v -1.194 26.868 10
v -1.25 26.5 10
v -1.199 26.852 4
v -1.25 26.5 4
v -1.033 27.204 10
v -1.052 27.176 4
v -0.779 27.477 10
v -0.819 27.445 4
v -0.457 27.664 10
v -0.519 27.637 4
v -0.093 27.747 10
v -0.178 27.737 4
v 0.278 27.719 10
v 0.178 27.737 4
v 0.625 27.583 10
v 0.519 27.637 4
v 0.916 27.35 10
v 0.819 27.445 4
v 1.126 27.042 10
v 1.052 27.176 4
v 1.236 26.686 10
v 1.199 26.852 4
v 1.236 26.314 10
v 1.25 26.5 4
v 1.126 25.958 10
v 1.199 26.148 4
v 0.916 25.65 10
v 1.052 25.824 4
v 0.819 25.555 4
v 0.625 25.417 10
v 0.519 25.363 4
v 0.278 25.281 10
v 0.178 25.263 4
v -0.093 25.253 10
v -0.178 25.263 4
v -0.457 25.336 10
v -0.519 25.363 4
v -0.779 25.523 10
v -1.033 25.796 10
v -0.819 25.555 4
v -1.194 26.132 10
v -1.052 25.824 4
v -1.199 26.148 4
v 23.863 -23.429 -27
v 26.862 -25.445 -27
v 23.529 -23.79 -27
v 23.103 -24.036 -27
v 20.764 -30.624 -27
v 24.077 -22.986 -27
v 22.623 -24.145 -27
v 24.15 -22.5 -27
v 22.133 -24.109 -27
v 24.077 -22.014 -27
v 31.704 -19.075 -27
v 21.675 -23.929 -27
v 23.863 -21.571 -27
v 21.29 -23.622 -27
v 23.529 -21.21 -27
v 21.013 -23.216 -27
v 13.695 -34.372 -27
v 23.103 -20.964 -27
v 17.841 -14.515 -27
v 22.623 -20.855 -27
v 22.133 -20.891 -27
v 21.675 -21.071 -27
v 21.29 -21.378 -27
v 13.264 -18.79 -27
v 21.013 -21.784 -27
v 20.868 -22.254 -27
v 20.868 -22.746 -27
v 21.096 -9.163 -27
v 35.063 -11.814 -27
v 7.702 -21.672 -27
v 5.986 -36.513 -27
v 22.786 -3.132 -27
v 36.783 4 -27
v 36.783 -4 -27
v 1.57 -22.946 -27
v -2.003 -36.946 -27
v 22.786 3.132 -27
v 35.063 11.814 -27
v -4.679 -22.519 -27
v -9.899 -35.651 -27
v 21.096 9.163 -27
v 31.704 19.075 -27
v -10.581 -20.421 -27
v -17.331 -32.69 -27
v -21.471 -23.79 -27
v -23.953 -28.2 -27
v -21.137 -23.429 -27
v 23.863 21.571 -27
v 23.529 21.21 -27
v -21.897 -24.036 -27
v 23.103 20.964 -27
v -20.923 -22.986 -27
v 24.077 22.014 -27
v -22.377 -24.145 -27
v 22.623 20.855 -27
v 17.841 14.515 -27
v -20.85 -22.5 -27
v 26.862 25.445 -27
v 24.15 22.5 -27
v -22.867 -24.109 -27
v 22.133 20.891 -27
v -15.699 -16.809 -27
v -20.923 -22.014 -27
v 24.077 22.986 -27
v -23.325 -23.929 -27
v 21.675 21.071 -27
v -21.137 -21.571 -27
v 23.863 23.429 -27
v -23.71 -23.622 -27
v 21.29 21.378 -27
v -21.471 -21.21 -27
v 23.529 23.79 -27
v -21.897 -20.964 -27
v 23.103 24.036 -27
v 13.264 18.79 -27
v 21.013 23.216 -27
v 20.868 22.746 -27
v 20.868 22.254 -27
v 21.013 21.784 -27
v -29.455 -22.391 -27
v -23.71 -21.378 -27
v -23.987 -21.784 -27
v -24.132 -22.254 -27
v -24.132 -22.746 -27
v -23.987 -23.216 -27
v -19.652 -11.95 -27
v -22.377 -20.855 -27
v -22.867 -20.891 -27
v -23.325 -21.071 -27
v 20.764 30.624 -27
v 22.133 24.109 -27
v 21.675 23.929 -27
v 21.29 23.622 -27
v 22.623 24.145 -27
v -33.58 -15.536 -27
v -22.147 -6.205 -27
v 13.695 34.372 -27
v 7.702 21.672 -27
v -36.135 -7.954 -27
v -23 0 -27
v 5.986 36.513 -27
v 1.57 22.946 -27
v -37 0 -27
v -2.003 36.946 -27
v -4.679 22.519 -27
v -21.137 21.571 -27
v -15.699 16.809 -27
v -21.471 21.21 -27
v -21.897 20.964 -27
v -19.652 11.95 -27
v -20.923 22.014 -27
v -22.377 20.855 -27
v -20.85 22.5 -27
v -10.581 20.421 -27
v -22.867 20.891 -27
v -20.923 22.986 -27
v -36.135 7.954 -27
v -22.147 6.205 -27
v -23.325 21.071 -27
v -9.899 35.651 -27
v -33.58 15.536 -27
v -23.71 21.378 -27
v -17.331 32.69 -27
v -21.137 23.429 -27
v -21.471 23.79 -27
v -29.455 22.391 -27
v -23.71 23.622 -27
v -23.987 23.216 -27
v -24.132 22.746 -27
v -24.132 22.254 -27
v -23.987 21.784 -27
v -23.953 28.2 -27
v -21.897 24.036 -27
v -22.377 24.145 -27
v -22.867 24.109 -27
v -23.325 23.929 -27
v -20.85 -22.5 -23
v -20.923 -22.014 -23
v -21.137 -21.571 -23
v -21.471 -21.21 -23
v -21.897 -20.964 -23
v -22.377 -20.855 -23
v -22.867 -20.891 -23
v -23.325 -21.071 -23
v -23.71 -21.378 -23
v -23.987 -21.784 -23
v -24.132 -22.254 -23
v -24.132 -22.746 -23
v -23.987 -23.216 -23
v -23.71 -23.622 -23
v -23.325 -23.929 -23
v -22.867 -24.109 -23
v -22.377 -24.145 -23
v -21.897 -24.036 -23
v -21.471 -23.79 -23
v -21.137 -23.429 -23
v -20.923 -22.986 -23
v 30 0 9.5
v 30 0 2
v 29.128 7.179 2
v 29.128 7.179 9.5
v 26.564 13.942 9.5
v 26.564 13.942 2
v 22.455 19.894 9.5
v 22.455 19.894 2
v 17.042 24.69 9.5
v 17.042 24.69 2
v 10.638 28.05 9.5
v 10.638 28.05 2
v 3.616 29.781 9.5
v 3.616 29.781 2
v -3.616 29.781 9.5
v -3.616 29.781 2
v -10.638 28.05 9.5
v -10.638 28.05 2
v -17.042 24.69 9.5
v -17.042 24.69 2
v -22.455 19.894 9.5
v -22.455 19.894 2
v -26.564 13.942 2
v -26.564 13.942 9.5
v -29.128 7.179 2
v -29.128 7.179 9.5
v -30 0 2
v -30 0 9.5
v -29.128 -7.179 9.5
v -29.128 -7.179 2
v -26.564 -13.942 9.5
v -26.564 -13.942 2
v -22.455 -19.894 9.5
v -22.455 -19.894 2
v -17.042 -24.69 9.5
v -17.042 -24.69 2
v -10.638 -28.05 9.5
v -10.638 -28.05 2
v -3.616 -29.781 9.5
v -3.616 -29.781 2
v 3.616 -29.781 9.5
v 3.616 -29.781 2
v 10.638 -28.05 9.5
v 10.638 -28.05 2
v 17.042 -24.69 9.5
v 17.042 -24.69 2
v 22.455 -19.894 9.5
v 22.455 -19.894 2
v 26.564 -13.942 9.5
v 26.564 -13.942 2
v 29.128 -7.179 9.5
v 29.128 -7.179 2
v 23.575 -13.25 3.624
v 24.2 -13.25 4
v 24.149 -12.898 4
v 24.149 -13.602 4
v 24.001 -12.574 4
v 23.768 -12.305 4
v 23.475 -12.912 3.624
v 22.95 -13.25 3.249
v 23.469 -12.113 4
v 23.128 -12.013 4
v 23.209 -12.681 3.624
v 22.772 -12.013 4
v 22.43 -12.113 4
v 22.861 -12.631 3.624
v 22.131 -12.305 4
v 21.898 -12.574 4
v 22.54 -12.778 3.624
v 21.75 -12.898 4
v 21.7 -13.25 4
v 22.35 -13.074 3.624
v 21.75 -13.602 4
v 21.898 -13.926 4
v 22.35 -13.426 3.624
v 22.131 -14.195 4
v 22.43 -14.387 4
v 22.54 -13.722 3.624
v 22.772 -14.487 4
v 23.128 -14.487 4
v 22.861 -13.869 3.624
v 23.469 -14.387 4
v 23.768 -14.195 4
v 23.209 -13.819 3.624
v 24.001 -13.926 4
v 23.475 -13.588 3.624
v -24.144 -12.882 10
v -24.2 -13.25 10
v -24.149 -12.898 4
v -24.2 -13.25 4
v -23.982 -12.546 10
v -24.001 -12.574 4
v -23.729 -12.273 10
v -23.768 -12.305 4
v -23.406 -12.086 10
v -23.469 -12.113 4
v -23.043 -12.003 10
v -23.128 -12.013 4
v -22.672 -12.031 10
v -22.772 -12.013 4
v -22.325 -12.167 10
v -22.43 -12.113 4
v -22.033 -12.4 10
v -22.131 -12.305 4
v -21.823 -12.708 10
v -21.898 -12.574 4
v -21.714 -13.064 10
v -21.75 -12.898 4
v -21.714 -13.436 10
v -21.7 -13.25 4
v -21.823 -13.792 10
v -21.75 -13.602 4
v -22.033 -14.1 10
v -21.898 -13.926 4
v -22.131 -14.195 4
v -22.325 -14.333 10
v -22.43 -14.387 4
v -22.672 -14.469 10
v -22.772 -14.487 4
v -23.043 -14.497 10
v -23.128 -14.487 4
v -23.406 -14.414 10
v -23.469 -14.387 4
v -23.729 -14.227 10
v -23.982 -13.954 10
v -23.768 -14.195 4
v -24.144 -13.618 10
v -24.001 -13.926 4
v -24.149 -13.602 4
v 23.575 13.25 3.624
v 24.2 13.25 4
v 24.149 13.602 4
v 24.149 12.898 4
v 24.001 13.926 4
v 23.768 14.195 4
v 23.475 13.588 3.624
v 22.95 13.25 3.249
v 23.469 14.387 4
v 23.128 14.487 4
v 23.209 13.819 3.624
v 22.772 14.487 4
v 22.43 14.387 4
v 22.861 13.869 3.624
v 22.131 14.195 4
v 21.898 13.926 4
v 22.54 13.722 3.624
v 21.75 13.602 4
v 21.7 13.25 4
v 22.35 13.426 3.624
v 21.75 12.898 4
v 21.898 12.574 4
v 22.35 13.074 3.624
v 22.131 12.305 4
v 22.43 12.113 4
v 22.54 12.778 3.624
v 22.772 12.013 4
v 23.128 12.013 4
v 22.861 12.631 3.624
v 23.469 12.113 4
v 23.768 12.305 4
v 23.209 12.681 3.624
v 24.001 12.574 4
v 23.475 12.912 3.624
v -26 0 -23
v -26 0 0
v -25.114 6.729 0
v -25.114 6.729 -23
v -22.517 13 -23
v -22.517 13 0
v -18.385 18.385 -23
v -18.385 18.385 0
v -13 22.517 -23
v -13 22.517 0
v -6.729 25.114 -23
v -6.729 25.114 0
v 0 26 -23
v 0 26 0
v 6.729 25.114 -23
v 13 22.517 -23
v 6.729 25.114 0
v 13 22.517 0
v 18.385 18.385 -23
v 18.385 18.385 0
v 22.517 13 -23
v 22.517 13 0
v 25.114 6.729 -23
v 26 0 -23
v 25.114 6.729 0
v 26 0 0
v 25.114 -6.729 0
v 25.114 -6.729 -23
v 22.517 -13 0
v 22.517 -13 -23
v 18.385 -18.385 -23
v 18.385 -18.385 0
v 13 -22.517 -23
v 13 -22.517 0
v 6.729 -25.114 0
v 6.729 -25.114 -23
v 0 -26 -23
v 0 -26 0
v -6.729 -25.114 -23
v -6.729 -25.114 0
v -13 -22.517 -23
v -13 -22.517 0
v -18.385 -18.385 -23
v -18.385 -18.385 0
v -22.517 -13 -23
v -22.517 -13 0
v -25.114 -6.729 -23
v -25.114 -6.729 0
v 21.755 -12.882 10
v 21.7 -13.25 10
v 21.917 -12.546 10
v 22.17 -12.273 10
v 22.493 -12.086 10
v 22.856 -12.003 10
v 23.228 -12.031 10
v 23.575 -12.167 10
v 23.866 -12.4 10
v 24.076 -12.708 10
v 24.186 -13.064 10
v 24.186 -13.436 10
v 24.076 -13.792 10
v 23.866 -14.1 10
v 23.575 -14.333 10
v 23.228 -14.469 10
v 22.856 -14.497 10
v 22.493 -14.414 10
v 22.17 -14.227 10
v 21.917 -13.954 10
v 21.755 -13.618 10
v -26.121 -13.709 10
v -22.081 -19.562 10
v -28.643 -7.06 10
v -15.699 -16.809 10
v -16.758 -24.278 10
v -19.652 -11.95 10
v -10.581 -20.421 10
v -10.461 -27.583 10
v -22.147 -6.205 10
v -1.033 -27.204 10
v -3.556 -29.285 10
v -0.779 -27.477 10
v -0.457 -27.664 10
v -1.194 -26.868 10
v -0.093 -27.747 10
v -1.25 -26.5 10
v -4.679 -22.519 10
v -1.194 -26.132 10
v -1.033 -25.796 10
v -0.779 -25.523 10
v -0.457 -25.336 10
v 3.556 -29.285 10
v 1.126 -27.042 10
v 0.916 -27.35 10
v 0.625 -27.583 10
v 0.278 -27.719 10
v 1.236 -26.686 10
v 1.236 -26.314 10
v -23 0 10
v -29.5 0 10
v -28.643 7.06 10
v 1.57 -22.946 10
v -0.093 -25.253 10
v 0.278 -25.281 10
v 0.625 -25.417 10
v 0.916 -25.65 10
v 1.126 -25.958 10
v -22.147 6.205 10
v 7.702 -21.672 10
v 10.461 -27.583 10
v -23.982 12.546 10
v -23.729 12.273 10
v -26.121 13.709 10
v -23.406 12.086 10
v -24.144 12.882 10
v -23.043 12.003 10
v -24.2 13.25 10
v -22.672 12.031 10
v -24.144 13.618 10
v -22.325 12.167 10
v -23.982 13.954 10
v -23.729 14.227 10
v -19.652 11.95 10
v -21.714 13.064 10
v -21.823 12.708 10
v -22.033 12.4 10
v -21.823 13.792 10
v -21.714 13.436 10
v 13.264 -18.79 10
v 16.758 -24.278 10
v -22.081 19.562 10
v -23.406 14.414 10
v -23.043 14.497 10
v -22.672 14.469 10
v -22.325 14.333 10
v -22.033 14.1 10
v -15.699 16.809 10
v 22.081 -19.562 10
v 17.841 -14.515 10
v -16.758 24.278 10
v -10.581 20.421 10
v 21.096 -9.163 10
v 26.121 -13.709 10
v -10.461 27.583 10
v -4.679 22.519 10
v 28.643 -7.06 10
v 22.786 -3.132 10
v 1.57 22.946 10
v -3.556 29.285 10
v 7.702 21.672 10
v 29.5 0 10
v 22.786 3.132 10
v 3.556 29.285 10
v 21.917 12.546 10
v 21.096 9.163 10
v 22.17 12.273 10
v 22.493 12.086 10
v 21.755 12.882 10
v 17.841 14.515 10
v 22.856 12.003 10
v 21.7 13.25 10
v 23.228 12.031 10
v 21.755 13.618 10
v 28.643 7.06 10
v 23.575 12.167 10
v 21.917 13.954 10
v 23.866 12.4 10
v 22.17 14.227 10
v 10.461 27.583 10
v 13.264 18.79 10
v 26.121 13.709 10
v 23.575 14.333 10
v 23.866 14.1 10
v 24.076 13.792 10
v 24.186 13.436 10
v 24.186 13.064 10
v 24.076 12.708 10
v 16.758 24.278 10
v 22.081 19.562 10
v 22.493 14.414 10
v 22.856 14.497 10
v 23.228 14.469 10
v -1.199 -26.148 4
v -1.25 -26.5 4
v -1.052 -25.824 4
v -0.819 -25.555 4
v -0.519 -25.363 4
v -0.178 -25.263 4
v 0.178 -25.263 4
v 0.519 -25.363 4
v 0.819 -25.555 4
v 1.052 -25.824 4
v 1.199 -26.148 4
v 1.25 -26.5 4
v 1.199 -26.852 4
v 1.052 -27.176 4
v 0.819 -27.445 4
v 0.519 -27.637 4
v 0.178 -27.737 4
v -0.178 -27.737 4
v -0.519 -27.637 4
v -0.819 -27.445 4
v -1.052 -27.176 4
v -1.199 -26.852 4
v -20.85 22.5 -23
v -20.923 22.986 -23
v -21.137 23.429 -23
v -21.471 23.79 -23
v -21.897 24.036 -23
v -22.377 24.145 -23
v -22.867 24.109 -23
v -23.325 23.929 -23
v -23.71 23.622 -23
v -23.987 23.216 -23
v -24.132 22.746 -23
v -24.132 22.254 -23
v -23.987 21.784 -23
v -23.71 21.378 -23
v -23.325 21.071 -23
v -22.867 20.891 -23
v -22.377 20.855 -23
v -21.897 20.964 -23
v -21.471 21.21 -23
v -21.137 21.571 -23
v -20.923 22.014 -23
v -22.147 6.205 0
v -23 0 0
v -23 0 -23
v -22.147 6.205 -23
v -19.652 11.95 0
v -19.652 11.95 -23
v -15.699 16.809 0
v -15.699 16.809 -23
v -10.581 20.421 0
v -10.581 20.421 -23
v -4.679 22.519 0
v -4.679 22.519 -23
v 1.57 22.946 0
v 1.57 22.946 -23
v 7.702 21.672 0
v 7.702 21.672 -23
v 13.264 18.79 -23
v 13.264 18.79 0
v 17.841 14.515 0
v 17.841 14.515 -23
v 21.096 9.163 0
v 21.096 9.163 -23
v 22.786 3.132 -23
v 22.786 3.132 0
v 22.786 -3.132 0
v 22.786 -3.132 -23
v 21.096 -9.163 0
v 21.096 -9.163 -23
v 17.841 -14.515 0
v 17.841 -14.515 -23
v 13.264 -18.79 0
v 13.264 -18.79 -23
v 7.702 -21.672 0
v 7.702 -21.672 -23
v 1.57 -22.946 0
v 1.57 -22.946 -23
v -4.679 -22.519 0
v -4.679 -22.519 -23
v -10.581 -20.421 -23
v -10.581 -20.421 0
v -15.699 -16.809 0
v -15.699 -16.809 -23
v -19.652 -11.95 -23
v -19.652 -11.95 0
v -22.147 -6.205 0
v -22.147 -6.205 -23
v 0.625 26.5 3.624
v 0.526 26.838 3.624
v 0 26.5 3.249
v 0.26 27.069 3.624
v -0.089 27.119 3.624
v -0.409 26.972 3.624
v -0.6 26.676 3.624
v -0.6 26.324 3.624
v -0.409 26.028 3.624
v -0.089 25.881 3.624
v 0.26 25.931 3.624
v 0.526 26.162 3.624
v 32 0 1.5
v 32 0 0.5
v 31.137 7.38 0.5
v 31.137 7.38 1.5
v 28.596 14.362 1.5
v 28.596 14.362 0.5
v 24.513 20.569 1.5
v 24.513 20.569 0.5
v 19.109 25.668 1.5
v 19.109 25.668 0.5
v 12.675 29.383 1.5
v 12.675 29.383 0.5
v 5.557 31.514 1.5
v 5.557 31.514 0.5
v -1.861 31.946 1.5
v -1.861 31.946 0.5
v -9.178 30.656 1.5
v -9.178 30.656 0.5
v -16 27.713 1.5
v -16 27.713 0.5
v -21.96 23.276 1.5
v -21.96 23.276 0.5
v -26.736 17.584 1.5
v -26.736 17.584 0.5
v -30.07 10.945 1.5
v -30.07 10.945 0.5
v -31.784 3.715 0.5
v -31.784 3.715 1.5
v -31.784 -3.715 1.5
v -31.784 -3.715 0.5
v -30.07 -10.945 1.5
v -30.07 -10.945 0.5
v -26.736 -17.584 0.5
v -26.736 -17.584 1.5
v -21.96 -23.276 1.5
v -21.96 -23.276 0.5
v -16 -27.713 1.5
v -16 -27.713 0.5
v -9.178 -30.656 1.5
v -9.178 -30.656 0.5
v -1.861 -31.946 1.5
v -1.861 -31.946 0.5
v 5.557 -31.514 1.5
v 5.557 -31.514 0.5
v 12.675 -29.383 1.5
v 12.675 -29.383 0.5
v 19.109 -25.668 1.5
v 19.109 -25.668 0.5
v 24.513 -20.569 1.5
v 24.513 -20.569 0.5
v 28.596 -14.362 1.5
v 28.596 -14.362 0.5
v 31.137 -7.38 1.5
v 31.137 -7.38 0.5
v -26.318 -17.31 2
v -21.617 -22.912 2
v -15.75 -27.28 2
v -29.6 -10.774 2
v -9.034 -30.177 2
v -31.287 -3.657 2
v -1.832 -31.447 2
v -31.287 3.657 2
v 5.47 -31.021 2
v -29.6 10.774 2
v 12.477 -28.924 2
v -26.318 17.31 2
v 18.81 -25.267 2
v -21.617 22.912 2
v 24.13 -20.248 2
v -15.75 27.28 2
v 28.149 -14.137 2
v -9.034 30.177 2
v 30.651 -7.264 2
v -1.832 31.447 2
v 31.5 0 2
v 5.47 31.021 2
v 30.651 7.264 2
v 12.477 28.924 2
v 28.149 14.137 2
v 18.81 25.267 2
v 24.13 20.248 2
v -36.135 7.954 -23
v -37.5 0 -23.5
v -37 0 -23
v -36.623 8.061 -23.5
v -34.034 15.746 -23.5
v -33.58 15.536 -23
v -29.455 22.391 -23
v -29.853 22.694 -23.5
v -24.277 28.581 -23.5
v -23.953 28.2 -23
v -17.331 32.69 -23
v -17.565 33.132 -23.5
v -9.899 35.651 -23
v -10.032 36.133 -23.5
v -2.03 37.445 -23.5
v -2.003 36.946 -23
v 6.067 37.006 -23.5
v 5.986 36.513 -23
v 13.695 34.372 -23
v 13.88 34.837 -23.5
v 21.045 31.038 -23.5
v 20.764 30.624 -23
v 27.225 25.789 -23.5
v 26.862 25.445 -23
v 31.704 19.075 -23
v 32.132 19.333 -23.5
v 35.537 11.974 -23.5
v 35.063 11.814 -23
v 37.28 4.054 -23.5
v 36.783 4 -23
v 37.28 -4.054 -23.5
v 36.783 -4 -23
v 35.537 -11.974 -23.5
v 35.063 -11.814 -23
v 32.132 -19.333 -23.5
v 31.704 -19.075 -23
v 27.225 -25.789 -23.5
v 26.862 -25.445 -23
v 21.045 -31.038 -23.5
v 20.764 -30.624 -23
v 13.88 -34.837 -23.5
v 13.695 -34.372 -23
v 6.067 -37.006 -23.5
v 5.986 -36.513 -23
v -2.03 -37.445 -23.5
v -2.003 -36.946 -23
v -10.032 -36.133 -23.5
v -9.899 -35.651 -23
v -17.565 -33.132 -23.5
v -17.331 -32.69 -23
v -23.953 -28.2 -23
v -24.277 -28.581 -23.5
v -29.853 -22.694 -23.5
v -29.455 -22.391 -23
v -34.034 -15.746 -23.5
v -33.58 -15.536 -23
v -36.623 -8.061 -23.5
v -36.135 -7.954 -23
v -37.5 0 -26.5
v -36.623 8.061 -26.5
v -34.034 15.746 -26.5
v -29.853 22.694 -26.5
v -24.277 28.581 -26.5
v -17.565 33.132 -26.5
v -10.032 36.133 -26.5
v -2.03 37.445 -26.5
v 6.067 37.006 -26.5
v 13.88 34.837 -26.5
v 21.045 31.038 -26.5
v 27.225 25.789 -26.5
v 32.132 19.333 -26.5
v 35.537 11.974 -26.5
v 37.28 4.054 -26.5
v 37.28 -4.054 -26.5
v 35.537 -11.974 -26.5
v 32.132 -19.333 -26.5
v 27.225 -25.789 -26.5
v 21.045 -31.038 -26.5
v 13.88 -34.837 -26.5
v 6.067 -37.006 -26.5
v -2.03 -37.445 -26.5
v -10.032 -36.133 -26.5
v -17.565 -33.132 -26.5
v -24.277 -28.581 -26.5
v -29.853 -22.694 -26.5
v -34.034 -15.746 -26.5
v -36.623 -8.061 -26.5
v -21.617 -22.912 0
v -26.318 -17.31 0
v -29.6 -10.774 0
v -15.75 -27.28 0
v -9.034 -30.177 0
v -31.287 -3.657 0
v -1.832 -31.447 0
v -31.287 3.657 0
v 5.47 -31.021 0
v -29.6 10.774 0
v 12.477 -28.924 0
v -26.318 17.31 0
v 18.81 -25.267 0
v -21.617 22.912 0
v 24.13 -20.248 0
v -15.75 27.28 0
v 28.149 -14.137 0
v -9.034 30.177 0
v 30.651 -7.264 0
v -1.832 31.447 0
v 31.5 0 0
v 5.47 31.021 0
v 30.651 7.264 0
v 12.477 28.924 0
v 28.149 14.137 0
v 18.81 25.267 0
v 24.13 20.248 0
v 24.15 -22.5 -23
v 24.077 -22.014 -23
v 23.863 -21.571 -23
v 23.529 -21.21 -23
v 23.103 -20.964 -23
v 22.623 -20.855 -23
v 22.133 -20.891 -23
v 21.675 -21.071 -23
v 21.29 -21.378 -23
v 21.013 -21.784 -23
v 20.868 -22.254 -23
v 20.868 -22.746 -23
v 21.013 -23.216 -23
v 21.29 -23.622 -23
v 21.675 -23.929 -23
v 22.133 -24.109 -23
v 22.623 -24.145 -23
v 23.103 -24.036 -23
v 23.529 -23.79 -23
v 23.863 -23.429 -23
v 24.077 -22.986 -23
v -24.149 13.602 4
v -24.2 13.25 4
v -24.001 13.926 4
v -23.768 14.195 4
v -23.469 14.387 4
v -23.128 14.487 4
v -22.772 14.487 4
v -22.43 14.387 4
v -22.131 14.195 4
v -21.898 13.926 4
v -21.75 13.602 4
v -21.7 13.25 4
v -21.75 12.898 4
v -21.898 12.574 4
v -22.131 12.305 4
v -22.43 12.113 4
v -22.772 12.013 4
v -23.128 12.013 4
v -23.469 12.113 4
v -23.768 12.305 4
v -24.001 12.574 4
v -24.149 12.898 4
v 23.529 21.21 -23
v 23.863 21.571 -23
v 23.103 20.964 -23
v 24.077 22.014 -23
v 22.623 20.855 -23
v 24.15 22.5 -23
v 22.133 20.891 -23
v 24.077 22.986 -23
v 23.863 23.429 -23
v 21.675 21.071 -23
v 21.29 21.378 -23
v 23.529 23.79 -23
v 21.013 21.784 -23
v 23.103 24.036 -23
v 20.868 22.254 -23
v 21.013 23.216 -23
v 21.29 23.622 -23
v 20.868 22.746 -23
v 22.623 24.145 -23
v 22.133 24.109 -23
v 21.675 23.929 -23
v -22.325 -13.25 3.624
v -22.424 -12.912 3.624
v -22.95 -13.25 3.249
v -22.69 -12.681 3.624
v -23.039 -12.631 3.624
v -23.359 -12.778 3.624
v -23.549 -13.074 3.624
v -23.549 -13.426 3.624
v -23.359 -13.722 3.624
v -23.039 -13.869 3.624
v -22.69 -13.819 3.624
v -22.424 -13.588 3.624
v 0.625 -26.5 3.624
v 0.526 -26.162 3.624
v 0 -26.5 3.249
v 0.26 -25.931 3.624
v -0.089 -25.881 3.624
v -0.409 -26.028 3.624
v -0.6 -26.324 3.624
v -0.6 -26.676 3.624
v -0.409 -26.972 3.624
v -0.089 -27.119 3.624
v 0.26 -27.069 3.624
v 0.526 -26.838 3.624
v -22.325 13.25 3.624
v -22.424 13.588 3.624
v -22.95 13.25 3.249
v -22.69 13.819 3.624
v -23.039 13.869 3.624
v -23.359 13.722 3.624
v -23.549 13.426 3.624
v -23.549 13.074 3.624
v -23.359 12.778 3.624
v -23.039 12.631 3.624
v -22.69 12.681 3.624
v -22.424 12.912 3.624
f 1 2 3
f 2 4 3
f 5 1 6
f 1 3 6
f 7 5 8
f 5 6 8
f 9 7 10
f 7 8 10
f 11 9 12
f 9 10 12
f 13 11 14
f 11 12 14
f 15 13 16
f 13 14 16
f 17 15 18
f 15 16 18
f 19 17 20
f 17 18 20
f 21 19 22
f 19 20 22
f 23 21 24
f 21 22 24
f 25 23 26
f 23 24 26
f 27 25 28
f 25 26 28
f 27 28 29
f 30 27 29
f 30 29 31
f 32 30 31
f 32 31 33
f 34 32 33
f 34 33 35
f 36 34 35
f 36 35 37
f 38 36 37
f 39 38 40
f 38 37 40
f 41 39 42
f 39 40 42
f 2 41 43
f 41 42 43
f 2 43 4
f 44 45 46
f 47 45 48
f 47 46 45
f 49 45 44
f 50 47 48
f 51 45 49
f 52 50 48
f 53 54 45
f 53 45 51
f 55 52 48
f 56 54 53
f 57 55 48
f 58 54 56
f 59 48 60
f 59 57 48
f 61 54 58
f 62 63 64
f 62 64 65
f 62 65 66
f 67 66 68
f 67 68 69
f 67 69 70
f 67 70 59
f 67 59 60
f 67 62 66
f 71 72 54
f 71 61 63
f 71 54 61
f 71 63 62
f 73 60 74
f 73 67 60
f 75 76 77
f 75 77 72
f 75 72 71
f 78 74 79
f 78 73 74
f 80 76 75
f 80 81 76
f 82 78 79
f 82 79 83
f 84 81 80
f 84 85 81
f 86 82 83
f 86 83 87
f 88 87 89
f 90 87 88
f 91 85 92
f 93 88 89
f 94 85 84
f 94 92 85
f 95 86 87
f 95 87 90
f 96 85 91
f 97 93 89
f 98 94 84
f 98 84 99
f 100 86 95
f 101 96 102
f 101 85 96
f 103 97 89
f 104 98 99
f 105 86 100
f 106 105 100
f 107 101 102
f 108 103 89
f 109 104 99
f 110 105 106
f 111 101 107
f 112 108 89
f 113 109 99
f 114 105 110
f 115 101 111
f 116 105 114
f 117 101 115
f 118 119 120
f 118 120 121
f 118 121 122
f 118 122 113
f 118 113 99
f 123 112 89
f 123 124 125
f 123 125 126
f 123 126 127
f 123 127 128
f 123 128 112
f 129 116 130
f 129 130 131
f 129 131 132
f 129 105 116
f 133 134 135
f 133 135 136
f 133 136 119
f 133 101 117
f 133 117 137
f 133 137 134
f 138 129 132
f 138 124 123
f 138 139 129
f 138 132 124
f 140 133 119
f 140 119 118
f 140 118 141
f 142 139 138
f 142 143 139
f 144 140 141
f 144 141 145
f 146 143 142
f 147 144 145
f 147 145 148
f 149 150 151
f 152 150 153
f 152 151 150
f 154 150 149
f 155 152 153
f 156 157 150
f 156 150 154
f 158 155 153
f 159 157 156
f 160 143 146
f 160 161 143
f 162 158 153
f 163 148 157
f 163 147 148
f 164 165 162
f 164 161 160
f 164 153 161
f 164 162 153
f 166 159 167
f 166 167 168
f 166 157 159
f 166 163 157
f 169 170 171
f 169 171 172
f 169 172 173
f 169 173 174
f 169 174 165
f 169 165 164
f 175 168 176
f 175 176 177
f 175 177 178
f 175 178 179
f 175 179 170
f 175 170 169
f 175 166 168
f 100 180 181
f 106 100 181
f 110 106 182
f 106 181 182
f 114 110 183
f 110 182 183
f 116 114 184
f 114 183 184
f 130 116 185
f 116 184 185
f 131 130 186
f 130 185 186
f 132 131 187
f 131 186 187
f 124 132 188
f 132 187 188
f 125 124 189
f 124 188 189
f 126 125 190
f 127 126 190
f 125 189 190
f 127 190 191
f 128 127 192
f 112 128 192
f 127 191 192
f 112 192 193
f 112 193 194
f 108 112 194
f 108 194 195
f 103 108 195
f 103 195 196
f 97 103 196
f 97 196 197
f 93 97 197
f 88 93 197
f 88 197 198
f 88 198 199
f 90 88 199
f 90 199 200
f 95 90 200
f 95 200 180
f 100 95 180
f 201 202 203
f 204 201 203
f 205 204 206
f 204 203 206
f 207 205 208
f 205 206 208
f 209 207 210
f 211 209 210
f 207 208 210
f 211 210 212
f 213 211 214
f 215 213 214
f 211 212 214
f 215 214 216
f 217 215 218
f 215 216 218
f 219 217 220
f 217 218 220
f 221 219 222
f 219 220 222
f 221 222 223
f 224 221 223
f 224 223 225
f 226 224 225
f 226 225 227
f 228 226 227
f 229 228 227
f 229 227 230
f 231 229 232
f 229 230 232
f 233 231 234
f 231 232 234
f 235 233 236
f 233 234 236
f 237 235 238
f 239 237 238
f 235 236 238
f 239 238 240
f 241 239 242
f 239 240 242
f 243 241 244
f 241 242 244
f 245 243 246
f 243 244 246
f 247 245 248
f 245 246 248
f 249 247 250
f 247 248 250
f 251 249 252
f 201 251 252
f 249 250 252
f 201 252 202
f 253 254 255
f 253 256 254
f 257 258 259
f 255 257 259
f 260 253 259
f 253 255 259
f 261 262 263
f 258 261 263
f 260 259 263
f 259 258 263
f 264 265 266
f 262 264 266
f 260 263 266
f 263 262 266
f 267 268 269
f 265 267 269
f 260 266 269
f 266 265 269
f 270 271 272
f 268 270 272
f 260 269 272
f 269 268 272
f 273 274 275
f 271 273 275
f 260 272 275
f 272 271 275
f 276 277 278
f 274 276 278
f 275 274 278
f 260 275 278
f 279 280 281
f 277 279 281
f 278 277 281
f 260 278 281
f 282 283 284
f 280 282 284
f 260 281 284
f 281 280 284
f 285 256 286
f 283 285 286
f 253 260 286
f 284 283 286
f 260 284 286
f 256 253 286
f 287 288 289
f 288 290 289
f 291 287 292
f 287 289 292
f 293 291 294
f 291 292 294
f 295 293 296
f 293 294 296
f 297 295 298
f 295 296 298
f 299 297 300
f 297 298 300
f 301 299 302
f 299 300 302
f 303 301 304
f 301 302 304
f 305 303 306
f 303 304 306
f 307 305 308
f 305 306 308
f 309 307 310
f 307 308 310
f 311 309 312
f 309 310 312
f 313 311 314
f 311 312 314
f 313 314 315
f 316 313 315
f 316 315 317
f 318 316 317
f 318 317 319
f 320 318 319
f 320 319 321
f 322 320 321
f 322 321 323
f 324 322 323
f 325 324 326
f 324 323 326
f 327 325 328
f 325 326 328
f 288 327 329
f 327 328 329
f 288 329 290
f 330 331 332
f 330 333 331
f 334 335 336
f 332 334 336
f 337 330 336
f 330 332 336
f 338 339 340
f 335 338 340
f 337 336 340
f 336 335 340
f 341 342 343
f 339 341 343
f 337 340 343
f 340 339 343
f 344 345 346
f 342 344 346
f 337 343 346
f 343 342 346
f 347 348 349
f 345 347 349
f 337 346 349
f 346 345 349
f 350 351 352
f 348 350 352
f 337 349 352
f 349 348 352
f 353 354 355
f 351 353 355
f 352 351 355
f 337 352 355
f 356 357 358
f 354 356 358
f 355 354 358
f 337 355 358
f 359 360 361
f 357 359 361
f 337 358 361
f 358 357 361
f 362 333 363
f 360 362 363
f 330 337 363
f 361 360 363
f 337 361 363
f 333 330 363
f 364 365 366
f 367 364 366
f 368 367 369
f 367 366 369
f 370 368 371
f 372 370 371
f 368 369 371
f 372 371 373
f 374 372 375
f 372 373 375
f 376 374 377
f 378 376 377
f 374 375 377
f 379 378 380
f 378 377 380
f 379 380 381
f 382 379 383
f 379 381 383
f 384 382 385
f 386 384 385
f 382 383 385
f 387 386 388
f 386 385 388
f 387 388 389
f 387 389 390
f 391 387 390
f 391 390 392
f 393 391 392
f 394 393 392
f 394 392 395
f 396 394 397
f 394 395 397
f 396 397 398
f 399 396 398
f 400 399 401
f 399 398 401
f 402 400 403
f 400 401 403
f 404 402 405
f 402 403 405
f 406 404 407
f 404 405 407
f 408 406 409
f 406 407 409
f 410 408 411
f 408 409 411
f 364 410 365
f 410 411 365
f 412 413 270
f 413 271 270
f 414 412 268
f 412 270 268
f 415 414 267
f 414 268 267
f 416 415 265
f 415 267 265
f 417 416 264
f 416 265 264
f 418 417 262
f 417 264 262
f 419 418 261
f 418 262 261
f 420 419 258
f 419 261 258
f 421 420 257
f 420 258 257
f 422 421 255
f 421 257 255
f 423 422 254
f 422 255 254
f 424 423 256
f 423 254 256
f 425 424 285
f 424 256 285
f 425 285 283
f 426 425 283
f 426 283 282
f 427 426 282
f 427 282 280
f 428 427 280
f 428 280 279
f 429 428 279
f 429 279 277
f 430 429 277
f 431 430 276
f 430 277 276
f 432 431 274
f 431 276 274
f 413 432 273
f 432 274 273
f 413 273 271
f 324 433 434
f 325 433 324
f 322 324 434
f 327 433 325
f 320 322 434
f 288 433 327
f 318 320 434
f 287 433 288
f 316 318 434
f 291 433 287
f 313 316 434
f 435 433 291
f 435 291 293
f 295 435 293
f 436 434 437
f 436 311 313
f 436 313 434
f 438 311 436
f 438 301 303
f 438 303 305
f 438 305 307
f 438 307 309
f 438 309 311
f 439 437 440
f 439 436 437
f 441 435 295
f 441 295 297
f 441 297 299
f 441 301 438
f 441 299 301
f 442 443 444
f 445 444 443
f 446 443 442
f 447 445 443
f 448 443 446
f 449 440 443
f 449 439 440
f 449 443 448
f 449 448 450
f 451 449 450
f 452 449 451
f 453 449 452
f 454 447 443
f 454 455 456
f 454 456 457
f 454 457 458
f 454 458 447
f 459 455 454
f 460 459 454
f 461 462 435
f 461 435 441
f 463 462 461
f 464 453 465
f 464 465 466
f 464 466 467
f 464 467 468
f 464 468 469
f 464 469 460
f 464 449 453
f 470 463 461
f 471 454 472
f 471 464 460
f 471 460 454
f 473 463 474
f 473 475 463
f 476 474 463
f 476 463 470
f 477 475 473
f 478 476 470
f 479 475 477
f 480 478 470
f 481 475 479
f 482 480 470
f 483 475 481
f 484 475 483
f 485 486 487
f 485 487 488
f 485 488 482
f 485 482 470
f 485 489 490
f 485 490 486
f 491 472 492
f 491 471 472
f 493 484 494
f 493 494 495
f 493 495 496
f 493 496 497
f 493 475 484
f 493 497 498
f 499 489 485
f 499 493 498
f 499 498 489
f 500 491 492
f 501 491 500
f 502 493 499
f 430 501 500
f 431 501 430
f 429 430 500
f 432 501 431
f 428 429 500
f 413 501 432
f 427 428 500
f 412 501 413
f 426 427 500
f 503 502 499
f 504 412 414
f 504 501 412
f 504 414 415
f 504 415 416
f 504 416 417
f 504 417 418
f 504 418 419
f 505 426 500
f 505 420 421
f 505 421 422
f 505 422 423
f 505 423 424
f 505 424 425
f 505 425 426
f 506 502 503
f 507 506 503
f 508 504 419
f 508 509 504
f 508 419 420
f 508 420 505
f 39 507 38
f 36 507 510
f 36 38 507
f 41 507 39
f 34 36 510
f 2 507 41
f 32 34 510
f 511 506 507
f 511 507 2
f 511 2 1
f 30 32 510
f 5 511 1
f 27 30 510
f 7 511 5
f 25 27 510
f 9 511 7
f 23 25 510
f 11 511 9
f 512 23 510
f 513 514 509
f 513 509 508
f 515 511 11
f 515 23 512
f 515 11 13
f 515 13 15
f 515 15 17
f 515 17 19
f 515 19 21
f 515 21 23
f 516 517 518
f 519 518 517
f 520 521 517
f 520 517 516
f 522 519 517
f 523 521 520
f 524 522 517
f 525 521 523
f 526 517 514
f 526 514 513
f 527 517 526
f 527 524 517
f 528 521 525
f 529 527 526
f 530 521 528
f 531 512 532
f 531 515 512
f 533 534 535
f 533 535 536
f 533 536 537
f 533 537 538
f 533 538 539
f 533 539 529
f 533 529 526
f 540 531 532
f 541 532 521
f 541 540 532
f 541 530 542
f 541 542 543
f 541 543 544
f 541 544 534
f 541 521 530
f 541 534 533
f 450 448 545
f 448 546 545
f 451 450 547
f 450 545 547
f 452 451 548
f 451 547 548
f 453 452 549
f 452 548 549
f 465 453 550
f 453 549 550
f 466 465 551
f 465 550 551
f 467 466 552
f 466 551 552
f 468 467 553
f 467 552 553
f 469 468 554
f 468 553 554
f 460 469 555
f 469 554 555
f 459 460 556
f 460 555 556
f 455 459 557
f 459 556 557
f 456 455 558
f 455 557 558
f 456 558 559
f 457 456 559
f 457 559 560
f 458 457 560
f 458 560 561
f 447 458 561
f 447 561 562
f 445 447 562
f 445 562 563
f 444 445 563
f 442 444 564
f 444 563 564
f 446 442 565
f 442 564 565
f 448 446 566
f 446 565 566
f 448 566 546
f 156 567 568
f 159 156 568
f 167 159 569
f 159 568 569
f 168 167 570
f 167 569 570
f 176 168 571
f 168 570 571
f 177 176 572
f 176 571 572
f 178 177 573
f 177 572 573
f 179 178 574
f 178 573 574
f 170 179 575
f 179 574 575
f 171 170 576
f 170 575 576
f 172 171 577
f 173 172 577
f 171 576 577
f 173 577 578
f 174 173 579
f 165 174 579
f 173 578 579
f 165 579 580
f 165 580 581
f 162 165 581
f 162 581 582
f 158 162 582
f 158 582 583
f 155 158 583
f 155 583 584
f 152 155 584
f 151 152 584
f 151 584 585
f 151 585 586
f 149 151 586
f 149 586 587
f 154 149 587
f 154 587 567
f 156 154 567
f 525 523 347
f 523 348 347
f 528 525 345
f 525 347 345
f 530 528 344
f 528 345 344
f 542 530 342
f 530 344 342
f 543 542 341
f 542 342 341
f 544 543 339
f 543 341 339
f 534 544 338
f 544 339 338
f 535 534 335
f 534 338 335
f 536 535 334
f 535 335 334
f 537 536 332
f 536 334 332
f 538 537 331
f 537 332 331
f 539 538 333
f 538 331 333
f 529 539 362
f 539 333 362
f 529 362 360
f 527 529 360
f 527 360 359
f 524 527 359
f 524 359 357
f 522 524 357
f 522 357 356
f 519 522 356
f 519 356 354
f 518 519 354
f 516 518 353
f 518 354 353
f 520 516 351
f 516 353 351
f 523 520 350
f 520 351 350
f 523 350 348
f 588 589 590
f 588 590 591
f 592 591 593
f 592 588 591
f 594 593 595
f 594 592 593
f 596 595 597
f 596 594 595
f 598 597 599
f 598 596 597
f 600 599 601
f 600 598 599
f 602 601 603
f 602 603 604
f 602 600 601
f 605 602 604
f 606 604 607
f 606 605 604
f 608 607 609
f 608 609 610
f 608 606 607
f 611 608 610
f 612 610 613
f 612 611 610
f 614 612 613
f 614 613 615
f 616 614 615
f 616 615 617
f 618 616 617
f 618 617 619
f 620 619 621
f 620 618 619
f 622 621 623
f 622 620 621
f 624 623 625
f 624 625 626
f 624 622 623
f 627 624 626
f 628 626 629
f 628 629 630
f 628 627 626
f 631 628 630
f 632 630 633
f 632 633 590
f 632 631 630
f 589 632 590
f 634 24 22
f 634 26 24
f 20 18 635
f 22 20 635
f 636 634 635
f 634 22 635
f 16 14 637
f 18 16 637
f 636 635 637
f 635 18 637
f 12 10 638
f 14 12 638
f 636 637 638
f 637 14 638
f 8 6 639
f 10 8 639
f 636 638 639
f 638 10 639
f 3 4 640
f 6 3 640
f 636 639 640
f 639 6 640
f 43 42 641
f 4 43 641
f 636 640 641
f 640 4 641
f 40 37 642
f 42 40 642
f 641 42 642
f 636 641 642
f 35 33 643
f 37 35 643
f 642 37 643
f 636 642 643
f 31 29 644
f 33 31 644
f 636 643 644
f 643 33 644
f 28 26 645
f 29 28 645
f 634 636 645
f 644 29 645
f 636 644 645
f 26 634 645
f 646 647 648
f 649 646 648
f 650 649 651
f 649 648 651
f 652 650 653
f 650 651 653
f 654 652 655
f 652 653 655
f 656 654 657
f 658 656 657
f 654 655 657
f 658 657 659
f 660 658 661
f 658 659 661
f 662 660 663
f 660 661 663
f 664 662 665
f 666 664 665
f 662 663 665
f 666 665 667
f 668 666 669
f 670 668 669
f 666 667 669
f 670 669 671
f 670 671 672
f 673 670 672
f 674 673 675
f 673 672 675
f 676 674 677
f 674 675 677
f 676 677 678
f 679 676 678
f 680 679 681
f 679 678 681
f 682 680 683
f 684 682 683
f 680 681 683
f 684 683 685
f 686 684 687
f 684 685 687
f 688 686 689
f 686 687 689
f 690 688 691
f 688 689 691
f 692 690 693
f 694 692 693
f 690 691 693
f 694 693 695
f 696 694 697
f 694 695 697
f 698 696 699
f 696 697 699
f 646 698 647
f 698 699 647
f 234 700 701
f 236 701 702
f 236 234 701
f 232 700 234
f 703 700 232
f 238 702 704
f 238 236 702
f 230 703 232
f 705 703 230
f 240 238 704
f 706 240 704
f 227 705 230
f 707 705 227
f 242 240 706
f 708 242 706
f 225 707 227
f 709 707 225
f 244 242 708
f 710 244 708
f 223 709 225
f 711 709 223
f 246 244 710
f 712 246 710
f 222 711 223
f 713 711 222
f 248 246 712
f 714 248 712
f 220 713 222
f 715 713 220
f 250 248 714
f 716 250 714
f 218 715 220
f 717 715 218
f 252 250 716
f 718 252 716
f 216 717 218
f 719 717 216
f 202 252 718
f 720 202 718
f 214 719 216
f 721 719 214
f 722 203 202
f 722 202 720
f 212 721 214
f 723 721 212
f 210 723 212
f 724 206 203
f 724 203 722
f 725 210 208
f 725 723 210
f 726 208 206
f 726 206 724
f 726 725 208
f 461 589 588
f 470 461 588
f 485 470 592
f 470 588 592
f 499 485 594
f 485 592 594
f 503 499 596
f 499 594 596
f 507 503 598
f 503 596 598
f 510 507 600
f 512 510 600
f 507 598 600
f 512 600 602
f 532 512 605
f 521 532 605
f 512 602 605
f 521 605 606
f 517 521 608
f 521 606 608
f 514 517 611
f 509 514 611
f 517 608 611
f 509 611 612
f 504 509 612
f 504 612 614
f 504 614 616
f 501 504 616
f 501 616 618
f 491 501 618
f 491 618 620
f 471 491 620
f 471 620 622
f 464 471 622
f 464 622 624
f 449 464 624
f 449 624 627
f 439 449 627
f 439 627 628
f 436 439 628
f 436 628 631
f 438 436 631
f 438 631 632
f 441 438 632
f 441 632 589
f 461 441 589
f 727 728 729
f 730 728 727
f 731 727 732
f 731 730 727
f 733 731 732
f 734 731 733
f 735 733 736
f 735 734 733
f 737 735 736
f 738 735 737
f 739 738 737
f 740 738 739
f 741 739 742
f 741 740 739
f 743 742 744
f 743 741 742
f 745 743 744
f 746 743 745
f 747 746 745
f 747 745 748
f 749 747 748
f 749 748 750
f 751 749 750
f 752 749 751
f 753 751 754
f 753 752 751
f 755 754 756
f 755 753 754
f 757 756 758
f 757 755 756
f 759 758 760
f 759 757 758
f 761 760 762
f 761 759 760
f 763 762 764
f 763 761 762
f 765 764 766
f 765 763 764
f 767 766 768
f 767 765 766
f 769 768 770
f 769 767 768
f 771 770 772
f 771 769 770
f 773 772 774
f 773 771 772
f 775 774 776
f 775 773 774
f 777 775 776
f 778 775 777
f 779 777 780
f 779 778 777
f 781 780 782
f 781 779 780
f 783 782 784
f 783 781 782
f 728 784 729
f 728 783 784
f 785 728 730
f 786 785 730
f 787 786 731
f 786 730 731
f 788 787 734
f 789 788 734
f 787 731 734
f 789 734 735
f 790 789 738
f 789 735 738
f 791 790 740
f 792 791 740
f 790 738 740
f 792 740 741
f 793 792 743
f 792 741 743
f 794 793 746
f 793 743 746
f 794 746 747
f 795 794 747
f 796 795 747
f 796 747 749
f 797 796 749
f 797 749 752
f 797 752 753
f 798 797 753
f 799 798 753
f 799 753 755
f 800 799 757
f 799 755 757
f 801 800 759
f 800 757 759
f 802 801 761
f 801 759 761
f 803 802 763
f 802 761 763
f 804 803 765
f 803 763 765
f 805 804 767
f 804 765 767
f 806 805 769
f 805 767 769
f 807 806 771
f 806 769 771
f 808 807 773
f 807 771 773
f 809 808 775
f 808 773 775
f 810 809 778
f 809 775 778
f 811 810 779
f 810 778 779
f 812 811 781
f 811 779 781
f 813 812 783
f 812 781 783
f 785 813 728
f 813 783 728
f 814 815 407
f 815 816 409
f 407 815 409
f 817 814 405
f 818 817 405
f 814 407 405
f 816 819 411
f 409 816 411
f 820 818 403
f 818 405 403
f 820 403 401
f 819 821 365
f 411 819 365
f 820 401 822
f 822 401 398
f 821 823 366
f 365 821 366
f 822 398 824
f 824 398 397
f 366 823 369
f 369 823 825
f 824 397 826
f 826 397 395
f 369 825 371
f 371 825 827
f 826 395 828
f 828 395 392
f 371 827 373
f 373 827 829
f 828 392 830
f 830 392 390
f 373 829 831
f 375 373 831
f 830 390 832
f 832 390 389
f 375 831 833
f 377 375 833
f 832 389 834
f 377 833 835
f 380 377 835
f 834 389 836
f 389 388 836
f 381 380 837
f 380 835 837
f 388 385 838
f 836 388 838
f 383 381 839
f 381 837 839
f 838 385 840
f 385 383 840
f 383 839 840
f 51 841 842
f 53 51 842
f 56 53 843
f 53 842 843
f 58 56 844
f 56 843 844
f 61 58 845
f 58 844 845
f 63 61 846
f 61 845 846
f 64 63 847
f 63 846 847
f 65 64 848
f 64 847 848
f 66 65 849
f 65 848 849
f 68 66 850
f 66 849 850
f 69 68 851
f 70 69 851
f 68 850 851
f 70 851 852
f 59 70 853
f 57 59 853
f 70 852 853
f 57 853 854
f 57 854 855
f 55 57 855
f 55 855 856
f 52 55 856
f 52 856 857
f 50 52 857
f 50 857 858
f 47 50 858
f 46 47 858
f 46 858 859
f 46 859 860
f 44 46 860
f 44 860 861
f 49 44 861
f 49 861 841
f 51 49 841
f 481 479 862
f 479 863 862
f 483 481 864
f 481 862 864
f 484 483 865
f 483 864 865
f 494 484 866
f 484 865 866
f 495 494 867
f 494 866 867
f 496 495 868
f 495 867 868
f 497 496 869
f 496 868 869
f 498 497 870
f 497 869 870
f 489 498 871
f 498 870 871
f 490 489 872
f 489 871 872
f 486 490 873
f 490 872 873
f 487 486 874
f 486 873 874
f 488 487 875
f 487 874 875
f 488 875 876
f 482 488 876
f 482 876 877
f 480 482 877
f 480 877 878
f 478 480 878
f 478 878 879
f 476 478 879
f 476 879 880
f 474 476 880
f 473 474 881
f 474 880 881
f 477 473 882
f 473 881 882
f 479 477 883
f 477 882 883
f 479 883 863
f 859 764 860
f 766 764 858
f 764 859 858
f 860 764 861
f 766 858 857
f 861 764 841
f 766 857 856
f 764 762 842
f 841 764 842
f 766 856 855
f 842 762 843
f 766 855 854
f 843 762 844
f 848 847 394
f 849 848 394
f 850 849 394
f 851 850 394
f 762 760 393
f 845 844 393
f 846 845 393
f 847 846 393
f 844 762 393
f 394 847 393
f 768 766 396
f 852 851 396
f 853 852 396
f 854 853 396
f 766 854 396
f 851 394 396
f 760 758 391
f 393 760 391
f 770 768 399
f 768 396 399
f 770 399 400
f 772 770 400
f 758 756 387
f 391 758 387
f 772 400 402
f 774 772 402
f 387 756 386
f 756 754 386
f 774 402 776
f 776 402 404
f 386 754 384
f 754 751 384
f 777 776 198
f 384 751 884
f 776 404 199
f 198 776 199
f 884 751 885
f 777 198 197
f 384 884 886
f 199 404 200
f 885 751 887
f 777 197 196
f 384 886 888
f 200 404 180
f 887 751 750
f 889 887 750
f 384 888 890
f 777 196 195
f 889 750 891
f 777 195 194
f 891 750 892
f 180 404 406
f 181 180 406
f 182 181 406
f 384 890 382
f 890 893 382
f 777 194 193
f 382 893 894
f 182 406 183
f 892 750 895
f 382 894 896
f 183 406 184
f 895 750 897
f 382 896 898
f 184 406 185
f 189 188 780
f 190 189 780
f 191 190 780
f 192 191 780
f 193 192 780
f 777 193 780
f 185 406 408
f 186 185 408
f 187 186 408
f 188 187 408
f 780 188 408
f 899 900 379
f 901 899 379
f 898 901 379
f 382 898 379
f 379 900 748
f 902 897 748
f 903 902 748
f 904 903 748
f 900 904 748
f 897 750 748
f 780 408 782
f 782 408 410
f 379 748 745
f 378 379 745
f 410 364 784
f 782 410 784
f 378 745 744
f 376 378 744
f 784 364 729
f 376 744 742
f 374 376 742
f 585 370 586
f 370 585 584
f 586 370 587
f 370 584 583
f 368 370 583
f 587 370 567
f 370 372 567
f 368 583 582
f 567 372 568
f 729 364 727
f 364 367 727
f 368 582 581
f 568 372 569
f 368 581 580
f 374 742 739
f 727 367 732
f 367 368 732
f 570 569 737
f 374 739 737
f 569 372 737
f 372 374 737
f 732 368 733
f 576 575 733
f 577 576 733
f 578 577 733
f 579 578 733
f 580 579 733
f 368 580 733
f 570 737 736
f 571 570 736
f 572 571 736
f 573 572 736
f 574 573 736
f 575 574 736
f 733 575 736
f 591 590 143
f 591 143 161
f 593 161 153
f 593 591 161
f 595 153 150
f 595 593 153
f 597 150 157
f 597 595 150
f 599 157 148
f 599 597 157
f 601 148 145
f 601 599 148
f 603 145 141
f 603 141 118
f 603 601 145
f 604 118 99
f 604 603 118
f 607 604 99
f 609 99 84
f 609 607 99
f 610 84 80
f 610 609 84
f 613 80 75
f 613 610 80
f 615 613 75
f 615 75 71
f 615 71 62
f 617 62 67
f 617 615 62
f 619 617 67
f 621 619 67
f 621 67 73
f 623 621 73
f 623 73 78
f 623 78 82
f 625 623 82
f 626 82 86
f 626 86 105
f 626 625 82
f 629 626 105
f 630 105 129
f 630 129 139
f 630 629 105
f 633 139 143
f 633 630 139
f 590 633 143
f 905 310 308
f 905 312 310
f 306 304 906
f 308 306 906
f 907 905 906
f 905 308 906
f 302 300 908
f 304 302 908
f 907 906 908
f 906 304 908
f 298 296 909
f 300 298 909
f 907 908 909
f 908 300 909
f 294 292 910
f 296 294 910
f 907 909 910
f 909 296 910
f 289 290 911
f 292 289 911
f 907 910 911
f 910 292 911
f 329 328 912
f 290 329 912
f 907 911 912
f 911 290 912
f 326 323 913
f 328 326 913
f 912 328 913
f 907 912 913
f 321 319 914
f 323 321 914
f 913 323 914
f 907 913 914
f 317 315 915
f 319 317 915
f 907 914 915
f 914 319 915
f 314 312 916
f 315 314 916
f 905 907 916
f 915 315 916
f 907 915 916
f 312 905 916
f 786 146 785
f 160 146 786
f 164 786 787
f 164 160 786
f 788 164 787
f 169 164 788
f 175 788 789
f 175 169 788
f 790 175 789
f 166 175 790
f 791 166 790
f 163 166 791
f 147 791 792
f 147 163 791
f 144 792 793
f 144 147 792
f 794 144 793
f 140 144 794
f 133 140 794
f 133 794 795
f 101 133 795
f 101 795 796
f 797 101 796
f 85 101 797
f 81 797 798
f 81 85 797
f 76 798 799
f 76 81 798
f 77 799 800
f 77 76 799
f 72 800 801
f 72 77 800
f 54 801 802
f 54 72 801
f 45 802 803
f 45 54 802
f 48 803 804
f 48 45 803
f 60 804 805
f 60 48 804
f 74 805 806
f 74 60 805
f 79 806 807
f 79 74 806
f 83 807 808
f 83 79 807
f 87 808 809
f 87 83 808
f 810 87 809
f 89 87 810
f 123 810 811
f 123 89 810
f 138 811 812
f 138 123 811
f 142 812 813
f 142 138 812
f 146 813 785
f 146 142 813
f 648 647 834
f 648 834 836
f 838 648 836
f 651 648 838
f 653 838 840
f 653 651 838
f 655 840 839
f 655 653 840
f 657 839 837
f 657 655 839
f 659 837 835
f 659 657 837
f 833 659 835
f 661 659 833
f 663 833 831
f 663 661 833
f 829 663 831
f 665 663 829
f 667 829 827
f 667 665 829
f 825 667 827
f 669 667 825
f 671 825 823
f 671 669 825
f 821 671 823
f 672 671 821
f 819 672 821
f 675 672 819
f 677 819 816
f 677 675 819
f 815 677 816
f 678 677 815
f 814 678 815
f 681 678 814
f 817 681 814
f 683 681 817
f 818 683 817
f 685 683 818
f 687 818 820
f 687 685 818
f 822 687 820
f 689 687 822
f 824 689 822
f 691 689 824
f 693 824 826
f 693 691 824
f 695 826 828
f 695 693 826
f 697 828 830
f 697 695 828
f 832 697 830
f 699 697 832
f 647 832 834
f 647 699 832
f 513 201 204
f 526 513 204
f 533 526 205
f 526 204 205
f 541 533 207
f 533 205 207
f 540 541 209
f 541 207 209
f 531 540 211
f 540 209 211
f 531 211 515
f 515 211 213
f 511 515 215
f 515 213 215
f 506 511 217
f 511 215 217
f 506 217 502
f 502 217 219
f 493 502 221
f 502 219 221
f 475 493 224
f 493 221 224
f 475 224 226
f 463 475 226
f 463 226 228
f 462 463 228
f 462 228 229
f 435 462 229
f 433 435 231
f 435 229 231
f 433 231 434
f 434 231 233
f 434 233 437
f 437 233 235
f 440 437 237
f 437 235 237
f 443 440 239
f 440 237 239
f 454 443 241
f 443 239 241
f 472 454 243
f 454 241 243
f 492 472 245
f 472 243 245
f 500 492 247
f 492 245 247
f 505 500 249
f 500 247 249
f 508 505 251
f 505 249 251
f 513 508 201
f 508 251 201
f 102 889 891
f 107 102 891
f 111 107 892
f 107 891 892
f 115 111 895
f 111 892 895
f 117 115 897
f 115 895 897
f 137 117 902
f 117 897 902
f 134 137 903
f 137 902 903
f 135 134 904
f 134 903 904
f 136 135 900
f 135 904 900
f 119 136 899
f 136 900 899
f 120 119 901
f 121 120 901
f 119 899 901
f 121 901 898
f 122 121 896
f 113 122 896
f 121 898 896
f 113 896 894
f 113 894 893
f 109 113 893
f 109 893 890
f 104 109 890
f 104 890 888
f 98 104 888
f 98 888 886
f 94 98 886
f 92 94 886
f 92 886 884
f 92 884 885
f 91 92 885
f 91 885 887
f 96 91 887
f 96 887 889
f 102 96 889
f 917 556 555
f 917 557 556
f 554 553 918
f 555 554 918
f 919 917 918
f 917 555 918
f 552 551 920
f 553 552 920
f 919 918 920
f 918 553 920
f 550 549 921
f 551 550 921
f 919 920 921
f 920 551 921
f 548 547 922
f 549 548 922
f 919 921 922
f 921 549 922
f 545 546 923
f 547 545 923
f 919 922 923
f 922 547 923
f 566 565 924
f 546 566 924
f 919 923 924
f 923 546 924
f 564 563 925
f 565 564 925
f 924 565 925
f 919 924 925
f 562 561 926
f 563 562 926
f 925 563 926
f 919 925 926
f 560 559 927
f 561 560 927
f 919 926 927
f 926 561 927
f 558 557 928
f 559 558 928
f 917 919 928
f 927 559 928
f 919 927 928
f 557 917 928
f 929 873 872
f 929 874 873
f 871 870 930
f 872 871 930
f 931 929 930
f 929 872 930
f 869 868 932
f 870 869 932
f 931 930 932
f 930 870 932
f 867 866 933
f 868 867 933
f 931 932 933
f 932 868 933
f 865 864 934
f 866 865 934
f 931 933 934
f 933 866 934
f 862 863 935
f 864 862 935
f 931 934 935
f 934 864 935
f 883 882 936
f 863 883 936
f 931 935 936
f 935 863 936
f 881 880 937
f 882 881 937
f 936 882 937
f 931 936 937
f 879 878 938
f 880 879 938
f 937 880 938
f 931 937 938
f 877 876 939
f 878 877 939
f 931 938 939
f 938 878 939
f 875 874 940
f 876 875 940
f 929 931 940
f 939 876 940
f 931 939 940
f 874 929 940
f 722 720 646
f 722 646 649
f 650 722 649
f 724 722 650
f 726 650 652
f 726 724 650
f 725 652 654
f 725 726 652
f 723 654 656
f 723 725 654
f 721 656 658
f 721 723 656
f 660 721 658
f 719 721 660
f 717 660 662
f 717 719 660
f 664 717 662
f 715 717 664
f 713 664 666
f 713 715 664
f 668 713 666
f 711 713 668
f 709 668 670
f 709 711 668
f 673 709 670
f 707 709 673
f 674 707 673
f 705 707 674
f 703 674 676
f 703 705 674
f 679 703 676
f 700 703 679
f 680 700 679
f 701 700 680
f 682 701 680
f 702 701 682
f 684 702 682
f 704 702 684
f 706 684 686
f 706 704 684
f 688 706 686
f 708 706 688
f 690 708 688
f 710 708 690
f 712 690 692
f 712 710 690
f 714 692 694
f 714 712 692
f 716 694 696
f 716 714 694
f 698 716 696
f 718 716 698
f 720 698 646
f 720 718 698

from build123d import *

# Parameters (mm, degrees)
SKETCH_1_R             = 32
EXTRUDE_1_DEPTH        = 2
SKETCH_2_R             = 30
EXTRUDE_2_DEPTH        = 8
SKETCH_3_R             = 23
CUT_EXTRUDE_1_DEPTH    = 11
SKETCH_4_R             = 26
SKETCH_4_R_2           = 23
EXTRUDE_3_DEPTH        = 23
SKETCH_5_R             = 37.5
SKETCH_5_R_2           = 1.75
SKETCH_5_R_3           = 26
SKETCH_5_R_4           = 23
EXTRUDE_4_DEPTH        = 4
HOLE_WIZARD_M4_3_D     = 3.3
HOLE_WIZARD_M4_3_DEPTH = 8.1
HOLE_WIZARD_M4_3_TIP   = 0.991420021
CHAMFER_1_SIZE         = 0.5
HOLE_WIZARD_M3_1_D     = 2.5
HOLE_WIZARD_M3_1_DEPTH = 6
HOLE_WIZARD_M3_1_TIP   = 0.751075774
CHAMFER_2_SIZE         = 0.5
CHAMFER_3_SIZE         = 0.5


with BuildPart() as part:
    # 草图1 → 凸台-拉伸1 (new body)
    with BuildSketch(Plane.XY):
        Circle(SKETCH_1_R)
    extrude(amount=EXTRUDE_1_DEPTH)

    # 草图2 → 凸台-拉伸2 (add)
    with BuildSketch(Plane.XY.offset(2)):
        Circle(SKETCH_2_R)
    extrude(amount=EXTRUDE_2_DEPTH)

    # 草图3 → 切除-拉伸1 (cut, through all)
    with BuildSketch(Plane(origin=(0, 0, 0), x_dir=(-1, 0, 0), z_dir=(0, 0, -1))):
        Circle(SKETCH_3_R)
    extrude(amount=-CUT_EXTRUDE_1_DEPTH, mode=Mode.SUBTRACT)

    # 草图4 → 凸台-拉伸3 (add)
    with BuildSketch(Plane(origin=(0, 0, 0), x_dir=(-1, 0, 0), z_dir=(0, 0, -1))):
        Circle(SKETCH_4_R)
        Circle(SKETCH_4_R_2, mode=Mode.SUBTRACT)
    extrude(amount=EXTRUDE_3_DEPTH)

    # 草图5 → 凸台-拉伸4 (add)
    with BuildSketch(Plane(origin=(0, 0, -23), x_dir=(-1, 0, 0), z_dir=(0, 0, -1))):
        Circle(SKETCH_5_R)
        with Locations((22.5, 22.5)):
            Circle(SKETCH_5_R_2, mode=Mode.SUBTRACT)
        with Locations((-22.5, 22.5)):
            Circle(SKETCH_5_R_2, mode=Mode.SUBTRACT)
        with Locations((-22.5, -22.5)):
            Circle(SKETCH_5_R_2, mode=Mode.SUBTRACT)
        with Locations((22.5, -22.5)):
            Circle(SKETCH_5_R_2, mode=Mode.SUBTRACT)
        Circle(SKETCH_5_R_3, mode=Mode.SUBTRACT)
        with Locations((22.5, 22.5)):
            Circle(SKETCH_5_R_2)
        with Locations((-22.5, 22.5)):
            Circle(SKETCH_5_R_2)
        with Locations((-22.5, -22.5)):
            Circle(SKETCH_5_R_2)
        with Locations((22.5, -22.5)):
            Circle(SKETCH_5_R_2)
        Circle(SKETCH_5_R_3)
        Circle(SKETCH_5_R_4, mode=Mode.SUBTRACT)
    extrude(amount=EXTRUDE_4_DEPTH)

    # M4 螺纹孔3
    with Locations(Plane(origin=(-22.5, -22.5, -27), x_dir=(-1, 0, 0), z_dir=(0, 0, -1))):
        with Locations((0, 0), (0, 45), (-45, 0), (-45, 45)):
            Hole(HOLE_WIZARD_M4_3_D / 2, depth=HOLE_WIZARD_M4_3_DEPTH)
            with Locations((0, 0, -(HOLE_WIZARD_M4_3_DEPTH + HOLE_WIZARD_M4_3_TIP / 2))):  # 118° drill point
                Cone(0, HOLE_WIZARD_M4_3_D / 2, HOLE_WIZARD_M4_3_TIP, mode=Mode.SUBTRACT)

    # 倒角1
    chamfer_1_edges = [part.edges().sort_by_distance(p)[0] for p in [
        (-32, 0, 0),
    ]]
    chamfer(chamfer_1_edges, length=CHAMFER_1_SIZE)

    # M3 螺纹孔1
    with Locations(Plane(origin=(0, -26.5, 10), x_dir=(1, 0, 0), z_dir=(0, 0, 1))):
        with Locations((0, 0), (22.9496732, 13.25), (22.9496732, 39.75), (0, 53), (-22.9496732, 39.75), (-22.9496732, 13.25)):
            Hole(HOLE_WIZARD_M3_1_D / 2, depth=HOLE_WIZARD_M3_1_DEPTH)
            with Locations((0, 0, -(HOLE_WIZARD_M3_1_DEPTH + HOLE_WIZARD_M3_1_TIP / 2))):  # 118° drill point
                Cone(0, HOLE_WIZARD_M3_1_D / 2, HOLE_WIZARD_M3_1_TIP, mode=Mode.SUBTRACT)

    # 倒角2
    chamfer_2_edges = [part.edges().sort_by_distance(p)[0] for p in [
        (37.5, 0, -23),
        (37.5, 0, -27),
    ]]
    chamfer(chamfer_2_edges, length=CHAMFER_2_SIZE)

    # 倒角3
    chamfer_3_edges = [part.edges().sort_by_distance(p)[0] for p in [
        (-32, 0, 2),
        (-30, 0, 10),
    ]]
    chamfer(chamfer_3_edges, length=CHAMFER_3_SIZE)


solid = part.part
